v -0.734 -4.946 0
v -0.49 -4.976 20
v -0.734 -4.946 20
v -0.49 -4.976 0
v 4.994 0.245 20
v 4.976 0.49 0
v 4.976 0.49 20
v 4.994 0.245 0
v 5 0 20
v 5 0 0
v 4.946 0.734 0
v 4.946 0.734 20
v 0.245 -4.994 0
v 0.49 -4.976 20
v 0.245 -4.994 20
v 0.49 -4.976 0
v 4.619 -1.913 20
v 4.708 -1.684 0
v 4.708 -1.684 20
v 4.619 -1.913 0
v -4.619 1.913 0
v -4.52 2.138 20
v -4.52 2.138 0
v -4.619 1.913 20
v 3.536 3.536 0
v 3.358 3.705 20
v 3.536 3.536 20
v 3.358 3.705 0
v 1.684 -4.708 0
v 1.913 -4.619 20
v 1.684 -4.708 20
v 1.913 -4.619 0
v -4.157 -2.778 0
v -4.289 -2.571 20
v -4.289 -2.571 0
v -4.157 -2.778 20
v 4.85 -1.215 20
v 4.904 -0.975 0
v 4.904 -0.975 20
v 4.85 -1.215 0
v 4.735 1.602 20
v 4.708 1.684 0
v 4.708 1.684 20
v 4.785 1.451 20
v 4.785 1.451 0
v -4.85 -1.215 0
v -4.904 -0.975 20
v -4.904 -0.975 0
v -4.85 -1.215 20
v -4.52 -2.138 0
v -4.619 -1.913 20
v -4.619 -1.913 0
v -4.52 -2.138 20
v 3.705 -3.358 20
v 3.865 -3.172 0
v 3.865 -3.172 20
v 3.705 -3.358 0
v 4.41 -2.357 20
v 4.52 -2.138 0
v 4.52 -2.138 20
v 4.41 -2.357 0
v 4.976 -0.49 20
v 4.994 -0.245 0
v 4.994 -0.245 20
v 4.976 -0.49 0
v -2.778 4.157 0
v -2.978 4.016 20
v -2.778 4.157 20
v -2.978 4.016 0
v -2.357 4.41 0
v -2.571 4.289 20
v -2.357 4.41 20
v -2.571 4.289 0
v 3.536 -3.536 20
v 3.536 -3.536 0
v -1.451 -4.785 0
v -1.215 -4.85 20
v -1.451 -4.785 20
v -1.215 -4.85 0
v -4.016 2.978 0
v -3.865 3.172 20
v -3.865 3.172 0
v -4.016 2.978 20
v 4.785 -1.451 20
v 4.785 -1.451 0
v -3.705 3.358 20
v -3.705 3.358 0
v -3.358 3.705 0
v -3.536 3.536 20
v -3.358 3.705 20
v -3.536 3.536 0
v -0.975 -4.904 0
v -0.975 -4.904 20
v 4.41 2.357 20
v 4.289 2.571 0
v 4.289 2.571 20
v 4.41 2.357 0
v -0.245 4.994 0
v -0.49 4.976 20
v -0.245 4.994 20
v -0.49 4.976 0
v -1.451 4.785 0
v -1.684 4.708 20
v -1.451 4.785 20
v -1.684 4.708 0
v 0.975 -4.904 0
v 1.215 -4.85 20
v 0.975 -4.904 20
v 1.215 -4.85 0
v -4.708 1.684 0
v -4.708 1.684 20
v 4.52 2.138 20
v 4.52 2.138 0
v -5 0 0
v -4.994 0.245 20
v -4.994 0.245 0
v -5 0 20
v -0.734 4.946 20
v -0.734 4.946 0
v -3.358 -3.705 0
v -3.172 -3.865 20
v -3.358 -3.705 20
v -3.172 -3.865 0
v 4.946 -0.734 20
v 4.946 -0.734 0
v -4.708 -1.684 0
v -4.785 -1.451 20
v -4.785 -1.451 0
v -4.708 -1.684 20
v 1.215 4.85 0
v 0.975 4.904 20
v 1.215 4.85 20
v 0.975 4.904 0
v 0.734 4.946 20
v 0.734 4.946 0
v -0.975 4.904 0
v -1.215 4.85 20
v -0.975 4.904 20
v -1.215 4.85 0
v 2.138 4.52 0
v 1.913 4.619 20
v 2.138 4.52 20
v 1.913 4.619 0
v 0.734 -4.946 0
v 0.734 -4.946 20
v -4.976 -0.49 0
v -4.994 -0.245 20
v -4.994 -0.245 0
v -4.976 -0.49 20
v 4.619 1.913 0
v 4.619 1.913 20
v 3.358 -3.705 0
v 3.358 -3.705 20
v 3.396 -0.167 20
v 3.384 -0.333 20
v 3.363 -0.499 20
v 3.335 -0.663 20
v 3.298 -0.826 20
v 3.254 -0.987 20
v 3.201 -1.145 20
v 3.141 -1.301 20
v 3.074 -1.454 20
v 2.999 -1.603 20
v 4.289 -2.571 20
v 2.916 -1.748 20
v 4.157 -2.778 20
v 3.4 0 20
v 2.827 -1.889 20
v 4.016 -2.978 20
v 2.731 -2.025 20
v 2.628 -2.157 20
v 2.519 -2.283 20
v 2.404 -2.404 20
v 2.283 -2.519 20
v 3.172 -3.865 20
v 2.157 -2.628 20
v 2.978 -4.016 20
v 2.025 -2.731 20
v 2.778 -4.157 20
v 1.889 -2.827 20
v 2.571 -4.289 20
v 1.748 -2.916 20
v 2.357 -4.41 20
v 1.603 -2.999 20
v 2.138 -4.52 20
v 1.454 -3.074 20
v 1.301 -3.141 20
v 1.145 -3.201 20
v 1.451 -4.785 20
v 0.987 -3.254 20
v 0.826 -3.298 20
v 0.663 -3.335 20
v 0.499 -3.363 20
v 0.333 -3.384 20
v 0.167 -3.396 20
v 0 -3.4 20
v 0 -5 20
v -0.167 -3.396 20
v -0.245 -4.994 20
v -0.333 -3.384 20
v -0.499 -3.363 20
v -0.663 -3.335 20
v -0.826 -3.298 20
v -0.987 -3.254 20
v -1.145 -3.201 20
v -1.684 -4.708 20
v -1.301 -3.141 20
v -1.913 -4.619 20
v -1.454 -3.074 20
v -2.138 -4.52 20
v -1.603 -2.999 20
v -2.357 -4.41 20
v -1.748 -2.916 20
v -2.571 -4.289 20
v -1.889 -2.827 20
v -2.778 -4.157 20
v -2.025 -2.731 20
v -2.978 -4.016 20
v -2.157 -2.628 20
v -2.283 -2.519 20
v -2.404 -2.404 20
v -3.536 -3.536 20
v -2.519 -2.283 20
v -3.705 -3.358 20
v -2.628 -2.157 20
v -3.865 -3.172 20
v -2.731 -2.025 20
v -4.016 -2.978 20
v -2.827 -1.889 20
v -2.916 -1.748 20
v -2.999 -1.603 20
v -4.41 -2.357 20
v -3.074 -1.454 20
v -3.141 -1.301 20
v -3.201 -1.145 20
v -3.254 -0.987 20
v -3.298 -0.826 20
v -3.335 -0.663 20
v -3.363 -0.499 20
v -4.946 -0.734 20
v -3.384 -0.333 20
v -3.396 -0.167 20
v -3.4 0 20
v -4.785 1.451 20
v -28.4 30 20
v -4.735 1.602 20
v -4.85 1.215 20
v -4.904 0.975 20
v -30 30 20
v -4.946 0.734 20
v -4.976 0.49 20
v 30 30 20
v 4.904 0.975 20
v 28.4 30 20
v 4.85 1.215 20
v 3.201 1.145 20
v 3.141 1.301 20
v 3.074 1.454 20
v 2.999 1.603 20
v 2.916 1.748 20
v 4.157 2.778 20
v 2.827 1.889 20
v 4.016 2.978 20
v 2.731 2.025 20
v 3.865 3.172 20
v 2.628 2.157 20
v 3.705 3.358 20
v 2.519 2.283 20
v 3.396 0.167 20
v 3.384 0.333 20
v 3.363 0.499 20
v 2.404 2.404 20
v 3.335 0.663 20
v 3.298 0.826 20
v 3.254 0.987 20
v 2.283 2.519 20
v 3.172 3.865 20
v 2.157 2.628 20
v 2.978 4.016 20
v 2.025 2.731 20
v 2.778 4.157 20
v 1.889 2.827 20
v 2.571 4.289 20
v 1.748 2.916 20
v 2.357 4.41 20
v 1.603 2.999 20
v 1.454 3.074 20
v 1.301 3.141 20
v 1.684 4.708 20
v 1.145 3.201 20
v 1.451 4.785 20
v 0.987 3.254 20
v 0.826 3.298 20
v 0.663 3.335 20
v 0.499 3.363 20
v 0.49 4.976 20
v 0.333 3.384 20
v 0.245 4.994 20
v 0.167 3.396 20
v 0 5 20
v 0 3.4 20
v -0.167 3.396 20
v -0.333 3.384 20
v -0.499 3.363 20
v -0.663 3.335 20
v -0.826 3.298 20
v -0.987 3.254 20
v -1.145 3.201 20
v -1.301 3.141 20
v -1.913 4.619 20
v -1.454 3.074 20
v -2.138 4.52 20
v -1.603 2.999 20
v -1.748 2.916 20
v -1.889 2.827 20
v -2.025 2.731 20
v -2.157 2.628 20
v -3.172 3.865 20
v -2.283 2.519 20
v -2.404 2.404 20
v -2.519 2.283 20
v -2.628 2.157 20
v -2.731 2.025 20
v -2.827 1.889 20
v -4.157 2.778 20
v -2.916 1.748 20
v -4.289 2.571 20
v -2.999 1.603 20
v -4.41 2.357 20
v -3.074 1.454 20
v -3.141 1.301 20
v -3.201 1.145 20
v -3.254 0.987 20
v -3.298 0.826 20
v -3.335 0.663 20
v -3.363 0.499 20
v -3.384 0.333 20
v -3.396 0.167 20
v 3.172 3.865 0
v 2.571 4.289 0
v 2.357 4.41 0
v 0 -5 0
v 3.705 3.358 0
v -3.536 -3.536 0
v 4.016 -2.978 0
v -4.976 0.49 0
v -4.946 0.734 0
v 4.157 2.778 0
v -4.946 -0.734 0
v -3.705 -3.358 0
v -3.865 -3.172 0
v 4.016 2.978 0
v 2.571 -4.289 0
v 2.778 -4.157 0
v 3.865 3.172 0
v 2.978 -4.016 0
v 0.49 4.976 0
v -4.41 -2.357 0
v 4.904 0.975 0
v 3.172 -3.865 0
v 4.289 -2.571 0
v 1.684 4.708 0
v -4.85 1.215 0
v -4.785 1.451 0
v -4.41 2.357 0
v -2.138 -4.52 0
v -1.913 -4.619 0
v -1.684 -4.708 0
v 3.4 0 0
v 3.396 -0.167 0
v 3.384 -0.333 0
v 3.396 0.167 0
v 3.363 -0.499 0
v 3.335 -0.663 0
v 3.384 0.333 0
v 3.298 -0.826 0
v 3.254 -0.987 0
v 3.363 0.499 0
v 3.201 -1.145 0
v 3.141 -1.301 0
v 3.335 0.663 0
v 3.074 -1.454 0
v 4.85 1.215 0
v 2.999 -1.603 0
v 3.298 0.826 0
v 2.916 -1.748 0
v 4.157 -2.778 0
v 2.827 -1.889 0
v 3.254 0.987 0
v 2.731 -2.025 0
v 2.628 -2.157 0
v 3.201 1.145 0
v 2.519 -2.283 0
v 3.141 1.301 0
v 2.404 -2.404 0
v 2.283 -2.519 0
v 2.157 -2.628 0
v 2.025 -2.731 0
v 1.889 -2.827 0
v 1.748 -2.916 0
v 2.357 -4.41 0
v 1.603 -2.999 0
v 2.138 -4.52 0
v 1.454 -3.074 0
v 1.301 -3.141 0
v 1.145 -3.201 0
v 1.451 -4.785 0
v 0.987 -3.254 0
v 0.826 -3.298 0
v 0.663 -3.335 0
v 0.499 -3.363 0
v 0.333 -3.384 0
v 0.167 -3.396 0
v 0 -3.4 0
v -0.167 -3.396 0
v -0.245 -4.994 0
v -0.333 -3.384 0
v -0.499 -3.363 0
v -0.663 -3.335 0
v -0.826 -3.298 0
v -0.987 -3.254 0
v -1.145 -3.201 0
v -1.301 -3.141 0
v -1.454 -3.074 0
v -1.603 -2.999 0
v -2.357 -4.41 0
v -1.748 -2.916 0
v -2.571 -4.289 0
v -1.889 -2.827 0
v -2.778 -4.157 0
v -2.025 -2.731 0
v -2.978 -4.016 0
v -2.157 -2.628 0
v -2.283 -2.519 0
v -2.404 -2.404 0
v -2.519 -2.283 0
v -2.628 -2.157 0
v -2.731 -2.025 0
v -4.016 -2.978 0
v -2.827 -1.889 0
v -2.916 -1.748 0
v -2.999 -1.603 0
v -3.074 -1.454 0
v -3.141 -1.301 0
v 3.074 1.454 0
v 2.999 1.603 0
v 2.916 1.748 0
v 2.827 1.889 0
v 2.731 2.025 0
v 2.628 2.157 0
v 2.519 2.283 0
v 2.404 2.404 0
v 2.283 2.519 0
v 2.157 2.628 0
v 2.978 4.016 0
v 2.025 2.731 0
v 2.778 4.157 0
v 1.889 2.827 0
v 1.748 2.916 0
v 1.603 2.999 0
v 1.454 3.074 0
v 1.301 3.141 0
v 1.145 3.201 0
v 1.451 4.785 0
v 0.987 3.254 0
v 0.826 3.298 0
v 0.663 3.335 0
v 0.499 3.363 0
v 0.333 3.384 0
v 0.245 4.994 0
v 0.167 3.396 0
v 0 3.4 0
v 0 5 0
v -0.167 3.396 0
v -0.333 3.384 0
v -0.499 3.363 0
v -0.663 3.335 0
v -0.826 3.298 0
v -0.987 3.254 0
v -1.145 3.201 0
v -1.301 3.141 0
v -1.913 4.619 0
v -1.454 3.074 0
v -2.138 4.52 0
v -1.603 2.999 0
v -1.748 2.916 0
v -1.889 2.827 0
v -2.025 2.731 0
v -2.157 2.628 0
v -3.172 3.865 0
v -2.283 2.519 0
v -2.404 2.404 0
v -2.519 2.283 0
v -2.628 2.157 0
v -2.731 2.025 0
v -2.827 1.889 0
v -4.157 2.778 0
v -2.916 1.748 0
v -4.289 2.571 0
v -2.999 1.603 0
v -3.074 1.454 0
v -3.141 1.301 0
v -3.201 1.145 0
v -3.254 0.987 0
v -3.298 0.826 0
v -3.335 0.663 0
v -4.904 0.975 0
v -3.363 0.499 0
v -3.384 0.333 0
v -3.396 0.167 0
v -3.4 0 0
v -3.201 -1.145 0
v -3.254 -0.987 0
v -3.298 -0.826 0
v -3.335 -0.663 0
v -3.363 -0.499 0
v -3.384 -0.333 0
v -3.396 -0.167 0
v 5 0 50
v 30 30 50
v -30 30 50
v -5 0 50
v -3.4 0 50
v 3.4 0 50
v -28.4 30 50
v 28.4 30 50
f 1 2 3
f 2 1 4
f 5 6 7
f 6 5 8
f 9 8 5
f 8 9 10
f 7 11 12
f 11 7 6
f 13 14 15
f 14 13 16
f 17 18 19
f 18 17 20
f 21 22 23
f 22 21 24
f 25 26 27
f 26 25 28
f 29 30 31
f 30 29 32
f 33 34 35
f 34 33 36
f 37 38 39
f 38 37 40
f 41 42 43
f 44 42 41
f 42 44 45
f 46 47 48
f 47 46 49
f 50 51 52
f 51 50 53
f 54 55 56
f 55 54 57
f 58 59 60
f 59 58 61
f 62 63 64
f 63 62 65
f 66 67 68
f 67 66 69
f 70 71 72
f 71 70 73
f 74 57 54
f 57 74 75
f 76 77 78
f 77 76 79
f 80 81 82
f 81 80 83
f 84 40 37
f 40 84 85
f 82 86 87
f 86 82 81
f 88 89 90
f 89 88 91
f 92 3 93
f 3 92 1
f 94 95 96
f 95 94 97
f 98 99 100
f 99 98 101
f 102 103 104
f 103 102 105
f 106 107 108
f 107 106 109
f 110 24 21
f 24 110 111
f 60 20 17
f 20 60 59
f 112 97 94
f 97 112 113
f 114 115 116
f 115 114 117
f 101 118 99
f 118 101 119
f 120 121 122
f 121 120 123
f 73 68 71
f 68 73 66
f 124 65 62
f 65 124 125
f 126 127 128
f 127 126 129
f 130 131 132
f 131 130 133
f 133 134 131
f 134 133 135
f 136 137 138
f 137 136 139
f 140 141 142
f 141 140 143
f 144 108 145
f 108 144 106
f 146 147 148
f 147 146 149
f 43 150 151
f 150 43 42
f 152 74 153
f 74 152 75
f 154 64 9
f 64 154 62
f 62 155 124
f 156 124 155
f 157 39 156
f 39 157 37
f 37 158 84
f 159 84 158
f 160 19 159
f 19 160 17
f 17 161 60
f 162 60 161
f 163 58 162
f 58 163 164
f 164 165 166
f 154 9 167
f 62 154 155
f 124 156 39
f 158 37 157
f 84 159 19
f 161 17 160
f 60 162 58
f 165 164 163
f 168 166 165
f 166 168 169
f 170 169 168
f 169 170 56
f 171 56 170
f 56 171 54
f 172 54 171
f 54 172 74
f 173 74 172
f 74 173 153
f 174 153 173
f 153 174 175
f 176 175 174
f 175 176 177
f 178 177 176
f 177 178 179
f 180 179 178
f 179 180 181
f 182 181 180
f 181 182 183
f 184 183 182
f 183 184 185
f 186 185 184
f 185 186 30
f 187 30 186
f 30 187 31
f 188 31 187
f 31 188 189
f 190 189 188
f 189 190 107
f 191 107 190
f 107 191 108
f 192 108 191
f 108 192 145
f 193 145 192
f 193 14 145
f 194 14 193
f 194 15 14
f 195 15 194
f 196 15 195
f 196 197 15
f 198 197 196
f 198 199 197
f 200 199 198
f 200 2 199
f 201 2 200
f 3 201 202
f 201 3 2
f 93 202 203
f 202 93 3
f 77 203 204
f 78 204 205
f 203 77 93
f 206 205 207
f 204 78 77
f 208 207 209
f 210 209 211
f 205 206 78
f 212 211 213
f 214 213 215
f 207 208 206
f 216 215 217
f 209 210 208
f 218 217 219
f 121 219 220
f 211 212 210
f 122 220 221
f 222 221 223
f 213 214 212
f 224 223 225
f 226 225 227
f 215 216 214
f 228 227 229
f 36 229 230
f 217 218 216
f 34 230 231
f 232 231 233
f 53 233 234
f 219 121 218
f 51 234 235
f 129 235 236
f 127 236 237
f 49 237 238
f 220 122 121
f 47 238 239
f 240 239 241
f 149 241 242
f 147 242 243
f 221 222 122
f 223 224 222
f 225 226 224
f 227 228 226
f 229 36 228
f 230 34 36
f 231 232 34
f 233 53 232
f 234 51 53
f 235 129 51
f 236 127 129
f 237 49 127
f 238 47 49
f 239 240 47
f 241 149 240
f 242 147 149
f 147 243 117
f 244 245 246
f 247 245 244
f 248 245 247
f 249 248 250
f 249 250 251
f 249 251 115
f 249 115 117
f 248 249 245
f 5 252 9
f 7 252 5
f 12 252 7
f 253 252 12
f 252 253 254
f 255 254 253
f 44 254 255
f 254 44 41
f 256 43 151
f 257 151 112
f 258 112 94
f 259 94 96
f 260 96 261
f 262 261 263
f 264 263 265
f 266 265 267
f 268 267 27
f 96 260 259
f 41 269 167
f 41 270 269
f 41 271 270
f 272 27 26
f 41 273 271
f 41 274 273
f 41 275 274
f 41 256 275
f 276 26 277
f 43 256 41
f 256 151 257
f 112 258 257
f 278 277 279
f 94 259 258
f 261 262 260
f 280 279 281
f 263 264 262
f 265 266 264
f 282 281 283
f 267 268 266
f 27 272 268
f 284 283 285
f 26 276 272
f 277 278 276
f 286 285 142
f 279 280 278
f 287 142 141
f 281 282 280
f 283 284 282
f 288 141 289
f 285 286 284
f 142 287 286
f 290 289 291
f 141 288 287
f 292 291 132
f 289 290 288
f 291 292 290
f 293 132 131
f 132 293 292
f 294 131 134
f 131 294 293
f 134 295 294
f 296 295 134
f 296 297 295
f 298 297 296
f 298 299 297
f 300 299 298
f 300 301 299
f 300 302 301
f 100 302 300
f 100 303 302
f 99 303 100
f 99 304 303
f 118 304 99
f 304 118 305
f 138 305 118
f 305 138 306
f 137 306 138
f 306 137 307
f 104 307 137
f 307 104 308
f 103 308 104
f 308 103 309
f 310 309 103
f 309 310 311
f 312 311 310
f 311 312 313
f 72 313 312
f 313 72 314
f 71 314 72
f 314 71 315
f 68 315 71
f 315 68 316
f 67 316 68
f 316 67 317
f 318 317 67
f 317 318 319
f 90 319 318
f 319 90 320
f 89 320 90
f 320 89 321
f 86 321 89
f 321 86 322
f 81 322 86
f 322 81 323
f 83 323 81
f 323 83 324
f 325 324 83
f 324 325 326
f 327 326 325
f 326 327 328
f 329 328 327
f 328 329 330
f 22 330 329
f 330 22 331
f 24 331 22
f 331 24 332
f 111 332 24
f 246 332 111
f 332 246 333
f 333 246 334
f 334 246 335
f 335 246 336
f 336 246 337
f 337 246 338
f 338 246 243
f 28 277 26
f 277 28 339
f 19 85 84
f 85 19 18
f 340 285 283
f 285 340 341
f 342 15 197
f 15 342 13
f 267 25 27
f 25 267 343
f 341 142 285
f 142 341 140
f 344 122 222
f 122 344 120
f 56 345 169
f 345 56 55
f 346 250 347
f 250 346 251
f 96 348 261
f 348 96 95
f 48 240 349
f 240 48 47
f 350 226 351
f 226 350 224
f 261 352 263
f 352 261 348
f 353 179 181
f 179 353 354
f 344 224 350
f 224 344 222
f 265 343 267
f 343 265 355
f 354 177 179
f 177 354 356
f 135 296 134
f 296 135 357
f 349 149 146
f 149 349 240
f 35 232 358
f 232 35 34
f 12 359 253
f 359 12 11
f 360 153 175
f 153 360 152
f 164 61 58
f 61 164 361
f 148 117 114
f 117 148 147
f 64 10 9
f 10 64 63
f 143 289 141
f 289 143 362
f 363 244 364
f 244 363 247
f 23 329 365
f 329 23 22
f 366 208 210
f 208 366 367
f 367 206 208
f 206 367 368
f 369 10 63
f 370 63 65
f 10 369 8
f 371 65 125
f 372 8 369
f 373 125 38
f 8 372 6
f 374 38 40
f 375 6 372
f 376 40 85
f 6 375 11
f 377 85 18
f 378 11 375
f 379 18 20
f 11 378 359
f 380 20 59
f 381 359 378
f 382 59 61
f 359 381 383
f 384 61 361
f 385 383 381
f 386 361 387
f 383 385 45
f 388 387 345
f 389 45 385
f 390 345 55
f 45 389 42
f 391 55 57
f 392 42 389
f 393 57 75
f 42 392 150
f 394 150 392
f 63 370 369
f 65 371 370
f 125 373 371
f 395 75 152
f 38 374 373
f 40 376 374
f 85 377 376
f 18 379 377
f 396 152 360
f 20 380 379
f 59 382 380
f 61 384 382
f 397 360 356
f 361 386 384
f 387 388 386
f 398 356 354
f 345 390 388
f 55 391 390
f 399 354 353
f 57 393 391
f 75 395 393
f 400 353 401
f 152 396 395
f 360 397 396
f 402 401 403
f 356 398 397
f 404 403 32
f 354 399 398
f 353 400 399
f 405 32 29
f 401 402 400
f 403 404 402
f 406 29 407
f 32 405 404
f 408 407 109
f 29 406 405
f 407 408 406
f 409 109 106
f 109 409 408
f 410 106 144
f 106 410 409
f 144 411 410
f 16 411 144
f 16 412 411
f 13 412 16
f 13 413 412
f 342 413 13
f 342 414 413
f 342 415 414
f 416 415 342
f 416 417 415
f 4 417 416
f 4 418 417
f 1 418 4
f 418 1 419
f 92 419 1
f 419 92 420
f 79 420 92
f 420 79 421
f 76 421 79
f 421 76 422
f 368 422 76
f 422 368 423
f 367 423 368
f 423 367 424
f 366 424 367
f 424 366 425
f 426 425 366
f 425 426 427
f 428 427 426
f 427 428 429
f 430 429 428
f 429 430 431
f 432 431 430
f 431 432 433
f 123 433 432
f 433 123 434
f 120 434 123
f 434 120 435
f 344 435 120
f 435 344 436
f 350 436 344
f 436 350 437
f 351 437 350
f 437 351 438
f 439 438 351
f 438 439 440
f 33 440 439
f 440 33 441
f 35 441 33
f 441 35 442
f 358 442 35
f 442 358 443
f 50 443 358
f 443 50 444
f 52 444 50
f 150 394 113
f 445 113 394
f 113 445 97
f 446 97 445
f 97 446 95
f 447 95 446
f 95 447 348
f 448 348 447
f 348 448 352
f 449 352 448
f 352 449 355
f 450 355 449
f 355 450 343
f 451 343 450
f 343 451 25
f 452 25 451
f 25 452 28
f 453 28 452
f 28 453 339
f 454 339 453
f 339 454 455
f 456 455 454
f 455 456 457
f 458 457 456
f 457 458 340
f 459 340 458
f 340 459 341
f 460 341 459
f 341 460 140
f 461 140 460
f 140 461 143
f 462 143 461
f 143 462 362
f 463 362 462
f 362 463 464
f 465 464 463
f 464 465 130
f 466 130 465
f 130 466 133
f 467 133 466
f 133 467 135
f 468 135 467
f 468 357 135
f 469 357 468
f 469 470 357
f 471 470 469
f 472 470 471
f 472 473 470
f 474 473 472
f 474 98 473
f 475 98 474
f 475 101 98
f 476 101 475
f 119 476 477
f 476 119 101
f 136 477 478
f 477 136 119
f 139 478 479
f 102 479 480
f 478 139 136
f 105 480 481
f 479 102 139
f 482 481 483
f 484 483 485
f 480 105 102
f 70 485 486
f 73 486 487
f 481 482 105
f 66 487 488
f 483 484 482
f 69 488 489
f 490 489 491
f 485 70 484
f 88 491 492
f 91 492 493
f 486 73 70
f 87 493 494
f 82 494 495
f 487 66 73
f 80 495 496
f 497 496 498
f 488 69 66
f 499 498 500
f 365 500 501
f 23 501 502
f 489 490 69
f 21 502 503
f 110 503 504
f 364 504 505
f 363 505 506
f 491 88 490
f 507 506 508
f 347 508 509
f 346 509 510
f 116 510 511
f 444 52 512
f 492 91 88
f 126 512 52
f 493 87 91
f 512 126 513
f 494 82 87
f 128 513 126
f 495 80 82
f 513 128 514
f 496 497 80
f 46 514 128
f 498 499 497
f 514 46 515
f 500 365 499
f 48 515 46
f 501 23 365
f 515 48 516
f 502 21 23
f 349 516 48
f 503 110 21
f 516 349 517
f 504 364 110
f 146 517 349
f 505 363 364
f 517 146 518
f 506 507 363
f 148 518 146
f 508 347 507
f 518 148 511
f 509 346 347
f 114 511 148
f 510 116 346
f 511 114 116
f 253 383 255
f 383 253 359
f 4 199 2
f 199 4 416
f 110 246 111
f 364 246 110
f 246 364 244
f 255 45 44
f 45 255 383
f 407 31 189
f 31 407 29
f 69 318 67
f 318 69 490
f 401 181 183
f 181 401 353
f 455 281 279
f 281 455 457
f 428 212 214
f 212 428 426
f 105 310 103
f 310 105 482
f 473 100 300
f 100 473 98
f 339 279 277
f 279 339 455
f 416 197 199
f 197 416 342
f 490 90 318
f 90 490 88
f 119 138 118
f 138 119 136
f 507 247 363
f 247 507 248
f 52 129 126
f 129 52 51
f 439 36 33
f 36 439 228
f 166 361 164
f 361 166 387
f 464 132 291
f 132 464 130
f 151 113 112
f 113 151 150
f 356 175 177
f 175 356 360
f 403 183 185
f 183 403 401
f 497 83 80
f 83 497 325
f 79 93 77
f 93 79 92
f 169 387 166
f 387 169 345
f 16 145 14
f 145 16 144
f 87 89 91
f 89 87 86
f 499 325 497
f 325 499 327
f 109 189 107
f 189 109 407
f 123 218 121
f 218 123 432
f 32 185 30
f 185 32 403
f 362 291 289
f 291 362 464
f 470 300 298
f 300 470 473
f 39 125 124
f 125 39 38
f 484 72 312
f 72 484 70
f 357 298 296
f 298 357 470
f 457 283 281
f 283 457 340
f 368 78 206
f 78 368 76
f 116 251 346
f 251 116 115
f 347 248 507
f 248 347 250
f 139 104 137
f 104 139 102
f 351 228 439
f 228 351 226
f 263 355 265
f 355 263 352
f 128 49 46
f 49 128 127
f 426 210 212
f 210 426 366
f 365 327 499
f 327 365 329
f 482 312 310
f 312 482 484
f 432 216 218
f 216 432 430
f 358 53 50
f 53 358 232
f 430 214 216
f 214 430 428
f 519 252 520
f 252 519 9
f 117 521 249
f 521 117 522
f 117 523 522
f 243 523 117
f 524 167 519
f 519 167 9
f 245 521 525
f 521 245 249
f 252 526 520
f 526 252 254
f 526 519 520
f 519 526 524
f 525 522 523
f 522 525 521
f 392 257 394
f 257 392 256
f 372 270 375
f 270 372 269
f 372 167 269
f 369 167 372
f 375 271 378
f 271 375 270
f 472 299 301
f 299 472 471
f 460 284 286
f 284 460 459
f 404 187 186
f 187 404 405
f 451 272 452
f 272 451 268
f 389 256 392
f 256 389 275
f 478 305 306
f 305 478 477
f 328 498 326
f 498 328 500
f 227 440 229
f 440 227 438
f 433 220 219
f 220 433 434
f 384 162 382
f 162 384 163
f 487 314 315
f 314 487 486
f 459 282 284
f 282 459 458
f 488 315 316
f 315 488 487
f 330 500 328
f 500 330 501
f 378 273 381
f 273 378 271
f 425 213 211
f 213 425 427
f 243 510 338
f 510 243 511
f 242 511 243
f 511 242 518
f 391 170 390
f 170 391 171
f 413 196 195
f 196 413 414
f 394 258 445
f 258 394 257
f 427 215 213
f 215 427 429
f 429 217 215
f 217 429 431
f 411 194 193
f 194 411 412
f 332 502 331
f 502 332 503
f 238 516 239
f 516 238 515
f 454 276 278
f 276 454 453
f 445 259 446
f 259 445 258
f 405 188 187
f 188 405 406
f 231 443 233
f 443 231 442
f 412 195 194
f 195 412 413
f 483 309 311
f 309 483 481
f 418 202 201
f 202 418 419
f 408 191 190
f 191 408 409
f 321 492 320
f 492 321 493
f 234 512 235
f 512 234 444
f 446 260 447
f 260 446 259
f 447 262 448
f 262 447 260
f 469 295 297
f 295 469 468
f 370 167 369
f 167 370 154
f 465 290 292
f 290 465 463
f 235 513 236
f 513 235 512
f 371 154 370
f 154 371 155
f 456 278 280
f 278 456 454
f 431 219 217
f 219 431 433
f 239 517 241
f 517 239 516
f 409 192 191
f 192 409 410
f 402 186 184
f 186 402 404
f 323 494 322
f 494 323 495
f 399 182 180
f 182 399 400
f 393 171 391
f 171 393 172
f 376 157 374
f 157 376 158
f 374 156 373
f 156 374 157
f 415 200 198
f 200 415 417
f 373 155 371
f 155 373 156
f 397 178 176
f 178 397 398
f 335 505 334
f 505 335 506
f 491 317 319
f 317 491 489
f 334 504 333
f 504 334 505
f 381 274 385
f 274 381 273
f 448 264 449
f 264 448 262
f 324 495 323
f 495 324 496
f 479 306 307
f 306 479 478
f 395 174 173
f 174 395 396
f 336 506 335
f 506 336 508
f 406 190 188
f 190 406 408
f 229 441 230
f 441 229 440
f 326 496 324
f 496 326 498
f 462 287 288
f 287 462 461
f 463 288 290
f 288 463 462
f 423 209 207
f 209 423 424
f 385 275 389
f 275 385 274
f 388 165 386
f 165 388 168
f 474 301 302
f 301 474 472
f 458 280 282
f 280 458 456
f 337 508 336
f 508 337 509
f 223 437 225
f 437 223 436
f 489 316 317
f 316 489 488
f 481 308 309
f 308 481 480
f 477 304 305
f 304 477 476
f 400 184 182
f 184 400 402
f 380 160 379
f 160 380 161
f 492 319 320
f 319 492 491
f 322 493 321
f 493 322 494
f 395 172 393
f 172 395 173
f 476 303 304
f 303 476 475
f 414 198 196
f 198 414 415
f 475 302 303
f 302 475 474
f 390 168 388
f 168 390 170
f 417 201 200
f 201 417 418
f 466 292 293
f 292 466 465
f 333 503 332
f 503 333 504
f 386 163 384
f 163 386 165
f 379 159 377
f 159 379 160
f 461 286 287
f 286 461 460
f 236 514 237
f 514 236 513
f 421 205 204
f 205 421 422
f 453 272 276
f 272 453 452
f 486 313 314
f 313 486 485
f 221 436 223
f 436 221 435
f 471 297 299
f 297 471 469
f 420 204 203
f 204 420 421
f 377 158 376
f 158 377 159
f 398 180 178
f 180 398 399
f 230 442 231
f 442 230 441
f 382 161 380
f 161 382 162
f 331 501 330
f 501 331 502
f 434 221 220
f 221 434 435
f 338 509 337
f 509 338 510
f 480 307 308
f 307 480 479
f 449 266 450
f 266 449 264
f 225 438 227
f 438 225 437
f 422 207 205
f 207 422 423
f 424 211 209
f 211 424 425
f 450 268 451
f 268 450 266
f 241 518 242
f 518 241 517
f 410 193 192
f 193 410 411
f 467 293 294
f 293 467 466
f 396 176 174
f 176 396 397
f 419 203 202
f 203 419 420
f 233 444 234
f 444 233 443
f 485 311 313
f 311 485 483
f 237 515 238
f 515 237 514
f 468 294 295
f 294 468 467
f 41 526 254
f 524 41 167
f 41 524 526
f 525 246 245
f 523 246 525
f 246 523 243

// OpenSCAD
// Lab Funnel Design
// Units: millimetres
// Orientation: Upright, wide opening at top, rests on XY plane at z=0

$fn = 128; // High resolution for smooth curves

// --- Dimensions ---
// Spout (Tube)
spout_outer_diameter = 10;
spout_inner_diameter = 6.8;
spout_length = 20;

// Cone (Funnel)
cone_bottom_diameter = 10; // Matches spout outer diameter
cone_top_diameter = 60;
cone_height = 30; // From z=20 to z=50

// Wall Thickness
wall_thickness = 1.6;

// Derived Inner Cone Dimensions
cone_bottom_inner_diameter = cone_bottom_diameter - (2 * wall_thickness);
cone_top_inner_diameter = cone_top_diameter - (2 * wall_thickness);

// --- Construction ---
// We build the outer shell and subtract the inner void.
// The part sits on the XY plane at z=0.

difference() {
    // --- OUTER SHELL ---
    union() {
        // 1. Spout Outer Cylinder (z=0 to z=20)
        cylinder(
            h = spout_length,
            d = spout_outer_diameter,
            center = false
        );

        // 2. Cone Outer Frustum (z=20 to z=50)
        // We use linear_extrude to create the cone from a 2D profile.
        // The profile is defined in the XZ plane.
        // Translate to start at z=20.
        translate([0, 0, spout_length]) {
            linear_extrude(height = cone_height, center = false) {
                polygon(
                    points = [
                        [-cone_bottom_diameter/2, 0],
                        [cone_bottom_diameter/2, 0],
                        [cone_top_diameter/2, cone_height],
                        [-cone_top_diameter/2, cone_height]
                    ],
                    convex = false
                );
            }
        }
    }

    // --- INNER VOID ---
    // Subtract the inner volume to create the bore.
    union() {
        // 1. Inner Cylinder (Spout Bore)
        cylinder(
            h = spout_length,
            d = spout_inner_diameter,
            center = false
        );

        // 2. Inner Cone Frustum
        translate([0, 0, spout_length]) {
            linear_extrude(height = cone_height, center = false) {
                polygon(
                    points = [
                        [-cone_bottom_inner_diameter/2, 0],
                        [cone_bottom_inner_diameter/2, 0],
                        [cone_top_inner_diameter/2, cone_height],
                        [-cone_top_inner_diameter/2, cone_height]
                    ],
                    convex = false
                );
            }
        }
    }
}
